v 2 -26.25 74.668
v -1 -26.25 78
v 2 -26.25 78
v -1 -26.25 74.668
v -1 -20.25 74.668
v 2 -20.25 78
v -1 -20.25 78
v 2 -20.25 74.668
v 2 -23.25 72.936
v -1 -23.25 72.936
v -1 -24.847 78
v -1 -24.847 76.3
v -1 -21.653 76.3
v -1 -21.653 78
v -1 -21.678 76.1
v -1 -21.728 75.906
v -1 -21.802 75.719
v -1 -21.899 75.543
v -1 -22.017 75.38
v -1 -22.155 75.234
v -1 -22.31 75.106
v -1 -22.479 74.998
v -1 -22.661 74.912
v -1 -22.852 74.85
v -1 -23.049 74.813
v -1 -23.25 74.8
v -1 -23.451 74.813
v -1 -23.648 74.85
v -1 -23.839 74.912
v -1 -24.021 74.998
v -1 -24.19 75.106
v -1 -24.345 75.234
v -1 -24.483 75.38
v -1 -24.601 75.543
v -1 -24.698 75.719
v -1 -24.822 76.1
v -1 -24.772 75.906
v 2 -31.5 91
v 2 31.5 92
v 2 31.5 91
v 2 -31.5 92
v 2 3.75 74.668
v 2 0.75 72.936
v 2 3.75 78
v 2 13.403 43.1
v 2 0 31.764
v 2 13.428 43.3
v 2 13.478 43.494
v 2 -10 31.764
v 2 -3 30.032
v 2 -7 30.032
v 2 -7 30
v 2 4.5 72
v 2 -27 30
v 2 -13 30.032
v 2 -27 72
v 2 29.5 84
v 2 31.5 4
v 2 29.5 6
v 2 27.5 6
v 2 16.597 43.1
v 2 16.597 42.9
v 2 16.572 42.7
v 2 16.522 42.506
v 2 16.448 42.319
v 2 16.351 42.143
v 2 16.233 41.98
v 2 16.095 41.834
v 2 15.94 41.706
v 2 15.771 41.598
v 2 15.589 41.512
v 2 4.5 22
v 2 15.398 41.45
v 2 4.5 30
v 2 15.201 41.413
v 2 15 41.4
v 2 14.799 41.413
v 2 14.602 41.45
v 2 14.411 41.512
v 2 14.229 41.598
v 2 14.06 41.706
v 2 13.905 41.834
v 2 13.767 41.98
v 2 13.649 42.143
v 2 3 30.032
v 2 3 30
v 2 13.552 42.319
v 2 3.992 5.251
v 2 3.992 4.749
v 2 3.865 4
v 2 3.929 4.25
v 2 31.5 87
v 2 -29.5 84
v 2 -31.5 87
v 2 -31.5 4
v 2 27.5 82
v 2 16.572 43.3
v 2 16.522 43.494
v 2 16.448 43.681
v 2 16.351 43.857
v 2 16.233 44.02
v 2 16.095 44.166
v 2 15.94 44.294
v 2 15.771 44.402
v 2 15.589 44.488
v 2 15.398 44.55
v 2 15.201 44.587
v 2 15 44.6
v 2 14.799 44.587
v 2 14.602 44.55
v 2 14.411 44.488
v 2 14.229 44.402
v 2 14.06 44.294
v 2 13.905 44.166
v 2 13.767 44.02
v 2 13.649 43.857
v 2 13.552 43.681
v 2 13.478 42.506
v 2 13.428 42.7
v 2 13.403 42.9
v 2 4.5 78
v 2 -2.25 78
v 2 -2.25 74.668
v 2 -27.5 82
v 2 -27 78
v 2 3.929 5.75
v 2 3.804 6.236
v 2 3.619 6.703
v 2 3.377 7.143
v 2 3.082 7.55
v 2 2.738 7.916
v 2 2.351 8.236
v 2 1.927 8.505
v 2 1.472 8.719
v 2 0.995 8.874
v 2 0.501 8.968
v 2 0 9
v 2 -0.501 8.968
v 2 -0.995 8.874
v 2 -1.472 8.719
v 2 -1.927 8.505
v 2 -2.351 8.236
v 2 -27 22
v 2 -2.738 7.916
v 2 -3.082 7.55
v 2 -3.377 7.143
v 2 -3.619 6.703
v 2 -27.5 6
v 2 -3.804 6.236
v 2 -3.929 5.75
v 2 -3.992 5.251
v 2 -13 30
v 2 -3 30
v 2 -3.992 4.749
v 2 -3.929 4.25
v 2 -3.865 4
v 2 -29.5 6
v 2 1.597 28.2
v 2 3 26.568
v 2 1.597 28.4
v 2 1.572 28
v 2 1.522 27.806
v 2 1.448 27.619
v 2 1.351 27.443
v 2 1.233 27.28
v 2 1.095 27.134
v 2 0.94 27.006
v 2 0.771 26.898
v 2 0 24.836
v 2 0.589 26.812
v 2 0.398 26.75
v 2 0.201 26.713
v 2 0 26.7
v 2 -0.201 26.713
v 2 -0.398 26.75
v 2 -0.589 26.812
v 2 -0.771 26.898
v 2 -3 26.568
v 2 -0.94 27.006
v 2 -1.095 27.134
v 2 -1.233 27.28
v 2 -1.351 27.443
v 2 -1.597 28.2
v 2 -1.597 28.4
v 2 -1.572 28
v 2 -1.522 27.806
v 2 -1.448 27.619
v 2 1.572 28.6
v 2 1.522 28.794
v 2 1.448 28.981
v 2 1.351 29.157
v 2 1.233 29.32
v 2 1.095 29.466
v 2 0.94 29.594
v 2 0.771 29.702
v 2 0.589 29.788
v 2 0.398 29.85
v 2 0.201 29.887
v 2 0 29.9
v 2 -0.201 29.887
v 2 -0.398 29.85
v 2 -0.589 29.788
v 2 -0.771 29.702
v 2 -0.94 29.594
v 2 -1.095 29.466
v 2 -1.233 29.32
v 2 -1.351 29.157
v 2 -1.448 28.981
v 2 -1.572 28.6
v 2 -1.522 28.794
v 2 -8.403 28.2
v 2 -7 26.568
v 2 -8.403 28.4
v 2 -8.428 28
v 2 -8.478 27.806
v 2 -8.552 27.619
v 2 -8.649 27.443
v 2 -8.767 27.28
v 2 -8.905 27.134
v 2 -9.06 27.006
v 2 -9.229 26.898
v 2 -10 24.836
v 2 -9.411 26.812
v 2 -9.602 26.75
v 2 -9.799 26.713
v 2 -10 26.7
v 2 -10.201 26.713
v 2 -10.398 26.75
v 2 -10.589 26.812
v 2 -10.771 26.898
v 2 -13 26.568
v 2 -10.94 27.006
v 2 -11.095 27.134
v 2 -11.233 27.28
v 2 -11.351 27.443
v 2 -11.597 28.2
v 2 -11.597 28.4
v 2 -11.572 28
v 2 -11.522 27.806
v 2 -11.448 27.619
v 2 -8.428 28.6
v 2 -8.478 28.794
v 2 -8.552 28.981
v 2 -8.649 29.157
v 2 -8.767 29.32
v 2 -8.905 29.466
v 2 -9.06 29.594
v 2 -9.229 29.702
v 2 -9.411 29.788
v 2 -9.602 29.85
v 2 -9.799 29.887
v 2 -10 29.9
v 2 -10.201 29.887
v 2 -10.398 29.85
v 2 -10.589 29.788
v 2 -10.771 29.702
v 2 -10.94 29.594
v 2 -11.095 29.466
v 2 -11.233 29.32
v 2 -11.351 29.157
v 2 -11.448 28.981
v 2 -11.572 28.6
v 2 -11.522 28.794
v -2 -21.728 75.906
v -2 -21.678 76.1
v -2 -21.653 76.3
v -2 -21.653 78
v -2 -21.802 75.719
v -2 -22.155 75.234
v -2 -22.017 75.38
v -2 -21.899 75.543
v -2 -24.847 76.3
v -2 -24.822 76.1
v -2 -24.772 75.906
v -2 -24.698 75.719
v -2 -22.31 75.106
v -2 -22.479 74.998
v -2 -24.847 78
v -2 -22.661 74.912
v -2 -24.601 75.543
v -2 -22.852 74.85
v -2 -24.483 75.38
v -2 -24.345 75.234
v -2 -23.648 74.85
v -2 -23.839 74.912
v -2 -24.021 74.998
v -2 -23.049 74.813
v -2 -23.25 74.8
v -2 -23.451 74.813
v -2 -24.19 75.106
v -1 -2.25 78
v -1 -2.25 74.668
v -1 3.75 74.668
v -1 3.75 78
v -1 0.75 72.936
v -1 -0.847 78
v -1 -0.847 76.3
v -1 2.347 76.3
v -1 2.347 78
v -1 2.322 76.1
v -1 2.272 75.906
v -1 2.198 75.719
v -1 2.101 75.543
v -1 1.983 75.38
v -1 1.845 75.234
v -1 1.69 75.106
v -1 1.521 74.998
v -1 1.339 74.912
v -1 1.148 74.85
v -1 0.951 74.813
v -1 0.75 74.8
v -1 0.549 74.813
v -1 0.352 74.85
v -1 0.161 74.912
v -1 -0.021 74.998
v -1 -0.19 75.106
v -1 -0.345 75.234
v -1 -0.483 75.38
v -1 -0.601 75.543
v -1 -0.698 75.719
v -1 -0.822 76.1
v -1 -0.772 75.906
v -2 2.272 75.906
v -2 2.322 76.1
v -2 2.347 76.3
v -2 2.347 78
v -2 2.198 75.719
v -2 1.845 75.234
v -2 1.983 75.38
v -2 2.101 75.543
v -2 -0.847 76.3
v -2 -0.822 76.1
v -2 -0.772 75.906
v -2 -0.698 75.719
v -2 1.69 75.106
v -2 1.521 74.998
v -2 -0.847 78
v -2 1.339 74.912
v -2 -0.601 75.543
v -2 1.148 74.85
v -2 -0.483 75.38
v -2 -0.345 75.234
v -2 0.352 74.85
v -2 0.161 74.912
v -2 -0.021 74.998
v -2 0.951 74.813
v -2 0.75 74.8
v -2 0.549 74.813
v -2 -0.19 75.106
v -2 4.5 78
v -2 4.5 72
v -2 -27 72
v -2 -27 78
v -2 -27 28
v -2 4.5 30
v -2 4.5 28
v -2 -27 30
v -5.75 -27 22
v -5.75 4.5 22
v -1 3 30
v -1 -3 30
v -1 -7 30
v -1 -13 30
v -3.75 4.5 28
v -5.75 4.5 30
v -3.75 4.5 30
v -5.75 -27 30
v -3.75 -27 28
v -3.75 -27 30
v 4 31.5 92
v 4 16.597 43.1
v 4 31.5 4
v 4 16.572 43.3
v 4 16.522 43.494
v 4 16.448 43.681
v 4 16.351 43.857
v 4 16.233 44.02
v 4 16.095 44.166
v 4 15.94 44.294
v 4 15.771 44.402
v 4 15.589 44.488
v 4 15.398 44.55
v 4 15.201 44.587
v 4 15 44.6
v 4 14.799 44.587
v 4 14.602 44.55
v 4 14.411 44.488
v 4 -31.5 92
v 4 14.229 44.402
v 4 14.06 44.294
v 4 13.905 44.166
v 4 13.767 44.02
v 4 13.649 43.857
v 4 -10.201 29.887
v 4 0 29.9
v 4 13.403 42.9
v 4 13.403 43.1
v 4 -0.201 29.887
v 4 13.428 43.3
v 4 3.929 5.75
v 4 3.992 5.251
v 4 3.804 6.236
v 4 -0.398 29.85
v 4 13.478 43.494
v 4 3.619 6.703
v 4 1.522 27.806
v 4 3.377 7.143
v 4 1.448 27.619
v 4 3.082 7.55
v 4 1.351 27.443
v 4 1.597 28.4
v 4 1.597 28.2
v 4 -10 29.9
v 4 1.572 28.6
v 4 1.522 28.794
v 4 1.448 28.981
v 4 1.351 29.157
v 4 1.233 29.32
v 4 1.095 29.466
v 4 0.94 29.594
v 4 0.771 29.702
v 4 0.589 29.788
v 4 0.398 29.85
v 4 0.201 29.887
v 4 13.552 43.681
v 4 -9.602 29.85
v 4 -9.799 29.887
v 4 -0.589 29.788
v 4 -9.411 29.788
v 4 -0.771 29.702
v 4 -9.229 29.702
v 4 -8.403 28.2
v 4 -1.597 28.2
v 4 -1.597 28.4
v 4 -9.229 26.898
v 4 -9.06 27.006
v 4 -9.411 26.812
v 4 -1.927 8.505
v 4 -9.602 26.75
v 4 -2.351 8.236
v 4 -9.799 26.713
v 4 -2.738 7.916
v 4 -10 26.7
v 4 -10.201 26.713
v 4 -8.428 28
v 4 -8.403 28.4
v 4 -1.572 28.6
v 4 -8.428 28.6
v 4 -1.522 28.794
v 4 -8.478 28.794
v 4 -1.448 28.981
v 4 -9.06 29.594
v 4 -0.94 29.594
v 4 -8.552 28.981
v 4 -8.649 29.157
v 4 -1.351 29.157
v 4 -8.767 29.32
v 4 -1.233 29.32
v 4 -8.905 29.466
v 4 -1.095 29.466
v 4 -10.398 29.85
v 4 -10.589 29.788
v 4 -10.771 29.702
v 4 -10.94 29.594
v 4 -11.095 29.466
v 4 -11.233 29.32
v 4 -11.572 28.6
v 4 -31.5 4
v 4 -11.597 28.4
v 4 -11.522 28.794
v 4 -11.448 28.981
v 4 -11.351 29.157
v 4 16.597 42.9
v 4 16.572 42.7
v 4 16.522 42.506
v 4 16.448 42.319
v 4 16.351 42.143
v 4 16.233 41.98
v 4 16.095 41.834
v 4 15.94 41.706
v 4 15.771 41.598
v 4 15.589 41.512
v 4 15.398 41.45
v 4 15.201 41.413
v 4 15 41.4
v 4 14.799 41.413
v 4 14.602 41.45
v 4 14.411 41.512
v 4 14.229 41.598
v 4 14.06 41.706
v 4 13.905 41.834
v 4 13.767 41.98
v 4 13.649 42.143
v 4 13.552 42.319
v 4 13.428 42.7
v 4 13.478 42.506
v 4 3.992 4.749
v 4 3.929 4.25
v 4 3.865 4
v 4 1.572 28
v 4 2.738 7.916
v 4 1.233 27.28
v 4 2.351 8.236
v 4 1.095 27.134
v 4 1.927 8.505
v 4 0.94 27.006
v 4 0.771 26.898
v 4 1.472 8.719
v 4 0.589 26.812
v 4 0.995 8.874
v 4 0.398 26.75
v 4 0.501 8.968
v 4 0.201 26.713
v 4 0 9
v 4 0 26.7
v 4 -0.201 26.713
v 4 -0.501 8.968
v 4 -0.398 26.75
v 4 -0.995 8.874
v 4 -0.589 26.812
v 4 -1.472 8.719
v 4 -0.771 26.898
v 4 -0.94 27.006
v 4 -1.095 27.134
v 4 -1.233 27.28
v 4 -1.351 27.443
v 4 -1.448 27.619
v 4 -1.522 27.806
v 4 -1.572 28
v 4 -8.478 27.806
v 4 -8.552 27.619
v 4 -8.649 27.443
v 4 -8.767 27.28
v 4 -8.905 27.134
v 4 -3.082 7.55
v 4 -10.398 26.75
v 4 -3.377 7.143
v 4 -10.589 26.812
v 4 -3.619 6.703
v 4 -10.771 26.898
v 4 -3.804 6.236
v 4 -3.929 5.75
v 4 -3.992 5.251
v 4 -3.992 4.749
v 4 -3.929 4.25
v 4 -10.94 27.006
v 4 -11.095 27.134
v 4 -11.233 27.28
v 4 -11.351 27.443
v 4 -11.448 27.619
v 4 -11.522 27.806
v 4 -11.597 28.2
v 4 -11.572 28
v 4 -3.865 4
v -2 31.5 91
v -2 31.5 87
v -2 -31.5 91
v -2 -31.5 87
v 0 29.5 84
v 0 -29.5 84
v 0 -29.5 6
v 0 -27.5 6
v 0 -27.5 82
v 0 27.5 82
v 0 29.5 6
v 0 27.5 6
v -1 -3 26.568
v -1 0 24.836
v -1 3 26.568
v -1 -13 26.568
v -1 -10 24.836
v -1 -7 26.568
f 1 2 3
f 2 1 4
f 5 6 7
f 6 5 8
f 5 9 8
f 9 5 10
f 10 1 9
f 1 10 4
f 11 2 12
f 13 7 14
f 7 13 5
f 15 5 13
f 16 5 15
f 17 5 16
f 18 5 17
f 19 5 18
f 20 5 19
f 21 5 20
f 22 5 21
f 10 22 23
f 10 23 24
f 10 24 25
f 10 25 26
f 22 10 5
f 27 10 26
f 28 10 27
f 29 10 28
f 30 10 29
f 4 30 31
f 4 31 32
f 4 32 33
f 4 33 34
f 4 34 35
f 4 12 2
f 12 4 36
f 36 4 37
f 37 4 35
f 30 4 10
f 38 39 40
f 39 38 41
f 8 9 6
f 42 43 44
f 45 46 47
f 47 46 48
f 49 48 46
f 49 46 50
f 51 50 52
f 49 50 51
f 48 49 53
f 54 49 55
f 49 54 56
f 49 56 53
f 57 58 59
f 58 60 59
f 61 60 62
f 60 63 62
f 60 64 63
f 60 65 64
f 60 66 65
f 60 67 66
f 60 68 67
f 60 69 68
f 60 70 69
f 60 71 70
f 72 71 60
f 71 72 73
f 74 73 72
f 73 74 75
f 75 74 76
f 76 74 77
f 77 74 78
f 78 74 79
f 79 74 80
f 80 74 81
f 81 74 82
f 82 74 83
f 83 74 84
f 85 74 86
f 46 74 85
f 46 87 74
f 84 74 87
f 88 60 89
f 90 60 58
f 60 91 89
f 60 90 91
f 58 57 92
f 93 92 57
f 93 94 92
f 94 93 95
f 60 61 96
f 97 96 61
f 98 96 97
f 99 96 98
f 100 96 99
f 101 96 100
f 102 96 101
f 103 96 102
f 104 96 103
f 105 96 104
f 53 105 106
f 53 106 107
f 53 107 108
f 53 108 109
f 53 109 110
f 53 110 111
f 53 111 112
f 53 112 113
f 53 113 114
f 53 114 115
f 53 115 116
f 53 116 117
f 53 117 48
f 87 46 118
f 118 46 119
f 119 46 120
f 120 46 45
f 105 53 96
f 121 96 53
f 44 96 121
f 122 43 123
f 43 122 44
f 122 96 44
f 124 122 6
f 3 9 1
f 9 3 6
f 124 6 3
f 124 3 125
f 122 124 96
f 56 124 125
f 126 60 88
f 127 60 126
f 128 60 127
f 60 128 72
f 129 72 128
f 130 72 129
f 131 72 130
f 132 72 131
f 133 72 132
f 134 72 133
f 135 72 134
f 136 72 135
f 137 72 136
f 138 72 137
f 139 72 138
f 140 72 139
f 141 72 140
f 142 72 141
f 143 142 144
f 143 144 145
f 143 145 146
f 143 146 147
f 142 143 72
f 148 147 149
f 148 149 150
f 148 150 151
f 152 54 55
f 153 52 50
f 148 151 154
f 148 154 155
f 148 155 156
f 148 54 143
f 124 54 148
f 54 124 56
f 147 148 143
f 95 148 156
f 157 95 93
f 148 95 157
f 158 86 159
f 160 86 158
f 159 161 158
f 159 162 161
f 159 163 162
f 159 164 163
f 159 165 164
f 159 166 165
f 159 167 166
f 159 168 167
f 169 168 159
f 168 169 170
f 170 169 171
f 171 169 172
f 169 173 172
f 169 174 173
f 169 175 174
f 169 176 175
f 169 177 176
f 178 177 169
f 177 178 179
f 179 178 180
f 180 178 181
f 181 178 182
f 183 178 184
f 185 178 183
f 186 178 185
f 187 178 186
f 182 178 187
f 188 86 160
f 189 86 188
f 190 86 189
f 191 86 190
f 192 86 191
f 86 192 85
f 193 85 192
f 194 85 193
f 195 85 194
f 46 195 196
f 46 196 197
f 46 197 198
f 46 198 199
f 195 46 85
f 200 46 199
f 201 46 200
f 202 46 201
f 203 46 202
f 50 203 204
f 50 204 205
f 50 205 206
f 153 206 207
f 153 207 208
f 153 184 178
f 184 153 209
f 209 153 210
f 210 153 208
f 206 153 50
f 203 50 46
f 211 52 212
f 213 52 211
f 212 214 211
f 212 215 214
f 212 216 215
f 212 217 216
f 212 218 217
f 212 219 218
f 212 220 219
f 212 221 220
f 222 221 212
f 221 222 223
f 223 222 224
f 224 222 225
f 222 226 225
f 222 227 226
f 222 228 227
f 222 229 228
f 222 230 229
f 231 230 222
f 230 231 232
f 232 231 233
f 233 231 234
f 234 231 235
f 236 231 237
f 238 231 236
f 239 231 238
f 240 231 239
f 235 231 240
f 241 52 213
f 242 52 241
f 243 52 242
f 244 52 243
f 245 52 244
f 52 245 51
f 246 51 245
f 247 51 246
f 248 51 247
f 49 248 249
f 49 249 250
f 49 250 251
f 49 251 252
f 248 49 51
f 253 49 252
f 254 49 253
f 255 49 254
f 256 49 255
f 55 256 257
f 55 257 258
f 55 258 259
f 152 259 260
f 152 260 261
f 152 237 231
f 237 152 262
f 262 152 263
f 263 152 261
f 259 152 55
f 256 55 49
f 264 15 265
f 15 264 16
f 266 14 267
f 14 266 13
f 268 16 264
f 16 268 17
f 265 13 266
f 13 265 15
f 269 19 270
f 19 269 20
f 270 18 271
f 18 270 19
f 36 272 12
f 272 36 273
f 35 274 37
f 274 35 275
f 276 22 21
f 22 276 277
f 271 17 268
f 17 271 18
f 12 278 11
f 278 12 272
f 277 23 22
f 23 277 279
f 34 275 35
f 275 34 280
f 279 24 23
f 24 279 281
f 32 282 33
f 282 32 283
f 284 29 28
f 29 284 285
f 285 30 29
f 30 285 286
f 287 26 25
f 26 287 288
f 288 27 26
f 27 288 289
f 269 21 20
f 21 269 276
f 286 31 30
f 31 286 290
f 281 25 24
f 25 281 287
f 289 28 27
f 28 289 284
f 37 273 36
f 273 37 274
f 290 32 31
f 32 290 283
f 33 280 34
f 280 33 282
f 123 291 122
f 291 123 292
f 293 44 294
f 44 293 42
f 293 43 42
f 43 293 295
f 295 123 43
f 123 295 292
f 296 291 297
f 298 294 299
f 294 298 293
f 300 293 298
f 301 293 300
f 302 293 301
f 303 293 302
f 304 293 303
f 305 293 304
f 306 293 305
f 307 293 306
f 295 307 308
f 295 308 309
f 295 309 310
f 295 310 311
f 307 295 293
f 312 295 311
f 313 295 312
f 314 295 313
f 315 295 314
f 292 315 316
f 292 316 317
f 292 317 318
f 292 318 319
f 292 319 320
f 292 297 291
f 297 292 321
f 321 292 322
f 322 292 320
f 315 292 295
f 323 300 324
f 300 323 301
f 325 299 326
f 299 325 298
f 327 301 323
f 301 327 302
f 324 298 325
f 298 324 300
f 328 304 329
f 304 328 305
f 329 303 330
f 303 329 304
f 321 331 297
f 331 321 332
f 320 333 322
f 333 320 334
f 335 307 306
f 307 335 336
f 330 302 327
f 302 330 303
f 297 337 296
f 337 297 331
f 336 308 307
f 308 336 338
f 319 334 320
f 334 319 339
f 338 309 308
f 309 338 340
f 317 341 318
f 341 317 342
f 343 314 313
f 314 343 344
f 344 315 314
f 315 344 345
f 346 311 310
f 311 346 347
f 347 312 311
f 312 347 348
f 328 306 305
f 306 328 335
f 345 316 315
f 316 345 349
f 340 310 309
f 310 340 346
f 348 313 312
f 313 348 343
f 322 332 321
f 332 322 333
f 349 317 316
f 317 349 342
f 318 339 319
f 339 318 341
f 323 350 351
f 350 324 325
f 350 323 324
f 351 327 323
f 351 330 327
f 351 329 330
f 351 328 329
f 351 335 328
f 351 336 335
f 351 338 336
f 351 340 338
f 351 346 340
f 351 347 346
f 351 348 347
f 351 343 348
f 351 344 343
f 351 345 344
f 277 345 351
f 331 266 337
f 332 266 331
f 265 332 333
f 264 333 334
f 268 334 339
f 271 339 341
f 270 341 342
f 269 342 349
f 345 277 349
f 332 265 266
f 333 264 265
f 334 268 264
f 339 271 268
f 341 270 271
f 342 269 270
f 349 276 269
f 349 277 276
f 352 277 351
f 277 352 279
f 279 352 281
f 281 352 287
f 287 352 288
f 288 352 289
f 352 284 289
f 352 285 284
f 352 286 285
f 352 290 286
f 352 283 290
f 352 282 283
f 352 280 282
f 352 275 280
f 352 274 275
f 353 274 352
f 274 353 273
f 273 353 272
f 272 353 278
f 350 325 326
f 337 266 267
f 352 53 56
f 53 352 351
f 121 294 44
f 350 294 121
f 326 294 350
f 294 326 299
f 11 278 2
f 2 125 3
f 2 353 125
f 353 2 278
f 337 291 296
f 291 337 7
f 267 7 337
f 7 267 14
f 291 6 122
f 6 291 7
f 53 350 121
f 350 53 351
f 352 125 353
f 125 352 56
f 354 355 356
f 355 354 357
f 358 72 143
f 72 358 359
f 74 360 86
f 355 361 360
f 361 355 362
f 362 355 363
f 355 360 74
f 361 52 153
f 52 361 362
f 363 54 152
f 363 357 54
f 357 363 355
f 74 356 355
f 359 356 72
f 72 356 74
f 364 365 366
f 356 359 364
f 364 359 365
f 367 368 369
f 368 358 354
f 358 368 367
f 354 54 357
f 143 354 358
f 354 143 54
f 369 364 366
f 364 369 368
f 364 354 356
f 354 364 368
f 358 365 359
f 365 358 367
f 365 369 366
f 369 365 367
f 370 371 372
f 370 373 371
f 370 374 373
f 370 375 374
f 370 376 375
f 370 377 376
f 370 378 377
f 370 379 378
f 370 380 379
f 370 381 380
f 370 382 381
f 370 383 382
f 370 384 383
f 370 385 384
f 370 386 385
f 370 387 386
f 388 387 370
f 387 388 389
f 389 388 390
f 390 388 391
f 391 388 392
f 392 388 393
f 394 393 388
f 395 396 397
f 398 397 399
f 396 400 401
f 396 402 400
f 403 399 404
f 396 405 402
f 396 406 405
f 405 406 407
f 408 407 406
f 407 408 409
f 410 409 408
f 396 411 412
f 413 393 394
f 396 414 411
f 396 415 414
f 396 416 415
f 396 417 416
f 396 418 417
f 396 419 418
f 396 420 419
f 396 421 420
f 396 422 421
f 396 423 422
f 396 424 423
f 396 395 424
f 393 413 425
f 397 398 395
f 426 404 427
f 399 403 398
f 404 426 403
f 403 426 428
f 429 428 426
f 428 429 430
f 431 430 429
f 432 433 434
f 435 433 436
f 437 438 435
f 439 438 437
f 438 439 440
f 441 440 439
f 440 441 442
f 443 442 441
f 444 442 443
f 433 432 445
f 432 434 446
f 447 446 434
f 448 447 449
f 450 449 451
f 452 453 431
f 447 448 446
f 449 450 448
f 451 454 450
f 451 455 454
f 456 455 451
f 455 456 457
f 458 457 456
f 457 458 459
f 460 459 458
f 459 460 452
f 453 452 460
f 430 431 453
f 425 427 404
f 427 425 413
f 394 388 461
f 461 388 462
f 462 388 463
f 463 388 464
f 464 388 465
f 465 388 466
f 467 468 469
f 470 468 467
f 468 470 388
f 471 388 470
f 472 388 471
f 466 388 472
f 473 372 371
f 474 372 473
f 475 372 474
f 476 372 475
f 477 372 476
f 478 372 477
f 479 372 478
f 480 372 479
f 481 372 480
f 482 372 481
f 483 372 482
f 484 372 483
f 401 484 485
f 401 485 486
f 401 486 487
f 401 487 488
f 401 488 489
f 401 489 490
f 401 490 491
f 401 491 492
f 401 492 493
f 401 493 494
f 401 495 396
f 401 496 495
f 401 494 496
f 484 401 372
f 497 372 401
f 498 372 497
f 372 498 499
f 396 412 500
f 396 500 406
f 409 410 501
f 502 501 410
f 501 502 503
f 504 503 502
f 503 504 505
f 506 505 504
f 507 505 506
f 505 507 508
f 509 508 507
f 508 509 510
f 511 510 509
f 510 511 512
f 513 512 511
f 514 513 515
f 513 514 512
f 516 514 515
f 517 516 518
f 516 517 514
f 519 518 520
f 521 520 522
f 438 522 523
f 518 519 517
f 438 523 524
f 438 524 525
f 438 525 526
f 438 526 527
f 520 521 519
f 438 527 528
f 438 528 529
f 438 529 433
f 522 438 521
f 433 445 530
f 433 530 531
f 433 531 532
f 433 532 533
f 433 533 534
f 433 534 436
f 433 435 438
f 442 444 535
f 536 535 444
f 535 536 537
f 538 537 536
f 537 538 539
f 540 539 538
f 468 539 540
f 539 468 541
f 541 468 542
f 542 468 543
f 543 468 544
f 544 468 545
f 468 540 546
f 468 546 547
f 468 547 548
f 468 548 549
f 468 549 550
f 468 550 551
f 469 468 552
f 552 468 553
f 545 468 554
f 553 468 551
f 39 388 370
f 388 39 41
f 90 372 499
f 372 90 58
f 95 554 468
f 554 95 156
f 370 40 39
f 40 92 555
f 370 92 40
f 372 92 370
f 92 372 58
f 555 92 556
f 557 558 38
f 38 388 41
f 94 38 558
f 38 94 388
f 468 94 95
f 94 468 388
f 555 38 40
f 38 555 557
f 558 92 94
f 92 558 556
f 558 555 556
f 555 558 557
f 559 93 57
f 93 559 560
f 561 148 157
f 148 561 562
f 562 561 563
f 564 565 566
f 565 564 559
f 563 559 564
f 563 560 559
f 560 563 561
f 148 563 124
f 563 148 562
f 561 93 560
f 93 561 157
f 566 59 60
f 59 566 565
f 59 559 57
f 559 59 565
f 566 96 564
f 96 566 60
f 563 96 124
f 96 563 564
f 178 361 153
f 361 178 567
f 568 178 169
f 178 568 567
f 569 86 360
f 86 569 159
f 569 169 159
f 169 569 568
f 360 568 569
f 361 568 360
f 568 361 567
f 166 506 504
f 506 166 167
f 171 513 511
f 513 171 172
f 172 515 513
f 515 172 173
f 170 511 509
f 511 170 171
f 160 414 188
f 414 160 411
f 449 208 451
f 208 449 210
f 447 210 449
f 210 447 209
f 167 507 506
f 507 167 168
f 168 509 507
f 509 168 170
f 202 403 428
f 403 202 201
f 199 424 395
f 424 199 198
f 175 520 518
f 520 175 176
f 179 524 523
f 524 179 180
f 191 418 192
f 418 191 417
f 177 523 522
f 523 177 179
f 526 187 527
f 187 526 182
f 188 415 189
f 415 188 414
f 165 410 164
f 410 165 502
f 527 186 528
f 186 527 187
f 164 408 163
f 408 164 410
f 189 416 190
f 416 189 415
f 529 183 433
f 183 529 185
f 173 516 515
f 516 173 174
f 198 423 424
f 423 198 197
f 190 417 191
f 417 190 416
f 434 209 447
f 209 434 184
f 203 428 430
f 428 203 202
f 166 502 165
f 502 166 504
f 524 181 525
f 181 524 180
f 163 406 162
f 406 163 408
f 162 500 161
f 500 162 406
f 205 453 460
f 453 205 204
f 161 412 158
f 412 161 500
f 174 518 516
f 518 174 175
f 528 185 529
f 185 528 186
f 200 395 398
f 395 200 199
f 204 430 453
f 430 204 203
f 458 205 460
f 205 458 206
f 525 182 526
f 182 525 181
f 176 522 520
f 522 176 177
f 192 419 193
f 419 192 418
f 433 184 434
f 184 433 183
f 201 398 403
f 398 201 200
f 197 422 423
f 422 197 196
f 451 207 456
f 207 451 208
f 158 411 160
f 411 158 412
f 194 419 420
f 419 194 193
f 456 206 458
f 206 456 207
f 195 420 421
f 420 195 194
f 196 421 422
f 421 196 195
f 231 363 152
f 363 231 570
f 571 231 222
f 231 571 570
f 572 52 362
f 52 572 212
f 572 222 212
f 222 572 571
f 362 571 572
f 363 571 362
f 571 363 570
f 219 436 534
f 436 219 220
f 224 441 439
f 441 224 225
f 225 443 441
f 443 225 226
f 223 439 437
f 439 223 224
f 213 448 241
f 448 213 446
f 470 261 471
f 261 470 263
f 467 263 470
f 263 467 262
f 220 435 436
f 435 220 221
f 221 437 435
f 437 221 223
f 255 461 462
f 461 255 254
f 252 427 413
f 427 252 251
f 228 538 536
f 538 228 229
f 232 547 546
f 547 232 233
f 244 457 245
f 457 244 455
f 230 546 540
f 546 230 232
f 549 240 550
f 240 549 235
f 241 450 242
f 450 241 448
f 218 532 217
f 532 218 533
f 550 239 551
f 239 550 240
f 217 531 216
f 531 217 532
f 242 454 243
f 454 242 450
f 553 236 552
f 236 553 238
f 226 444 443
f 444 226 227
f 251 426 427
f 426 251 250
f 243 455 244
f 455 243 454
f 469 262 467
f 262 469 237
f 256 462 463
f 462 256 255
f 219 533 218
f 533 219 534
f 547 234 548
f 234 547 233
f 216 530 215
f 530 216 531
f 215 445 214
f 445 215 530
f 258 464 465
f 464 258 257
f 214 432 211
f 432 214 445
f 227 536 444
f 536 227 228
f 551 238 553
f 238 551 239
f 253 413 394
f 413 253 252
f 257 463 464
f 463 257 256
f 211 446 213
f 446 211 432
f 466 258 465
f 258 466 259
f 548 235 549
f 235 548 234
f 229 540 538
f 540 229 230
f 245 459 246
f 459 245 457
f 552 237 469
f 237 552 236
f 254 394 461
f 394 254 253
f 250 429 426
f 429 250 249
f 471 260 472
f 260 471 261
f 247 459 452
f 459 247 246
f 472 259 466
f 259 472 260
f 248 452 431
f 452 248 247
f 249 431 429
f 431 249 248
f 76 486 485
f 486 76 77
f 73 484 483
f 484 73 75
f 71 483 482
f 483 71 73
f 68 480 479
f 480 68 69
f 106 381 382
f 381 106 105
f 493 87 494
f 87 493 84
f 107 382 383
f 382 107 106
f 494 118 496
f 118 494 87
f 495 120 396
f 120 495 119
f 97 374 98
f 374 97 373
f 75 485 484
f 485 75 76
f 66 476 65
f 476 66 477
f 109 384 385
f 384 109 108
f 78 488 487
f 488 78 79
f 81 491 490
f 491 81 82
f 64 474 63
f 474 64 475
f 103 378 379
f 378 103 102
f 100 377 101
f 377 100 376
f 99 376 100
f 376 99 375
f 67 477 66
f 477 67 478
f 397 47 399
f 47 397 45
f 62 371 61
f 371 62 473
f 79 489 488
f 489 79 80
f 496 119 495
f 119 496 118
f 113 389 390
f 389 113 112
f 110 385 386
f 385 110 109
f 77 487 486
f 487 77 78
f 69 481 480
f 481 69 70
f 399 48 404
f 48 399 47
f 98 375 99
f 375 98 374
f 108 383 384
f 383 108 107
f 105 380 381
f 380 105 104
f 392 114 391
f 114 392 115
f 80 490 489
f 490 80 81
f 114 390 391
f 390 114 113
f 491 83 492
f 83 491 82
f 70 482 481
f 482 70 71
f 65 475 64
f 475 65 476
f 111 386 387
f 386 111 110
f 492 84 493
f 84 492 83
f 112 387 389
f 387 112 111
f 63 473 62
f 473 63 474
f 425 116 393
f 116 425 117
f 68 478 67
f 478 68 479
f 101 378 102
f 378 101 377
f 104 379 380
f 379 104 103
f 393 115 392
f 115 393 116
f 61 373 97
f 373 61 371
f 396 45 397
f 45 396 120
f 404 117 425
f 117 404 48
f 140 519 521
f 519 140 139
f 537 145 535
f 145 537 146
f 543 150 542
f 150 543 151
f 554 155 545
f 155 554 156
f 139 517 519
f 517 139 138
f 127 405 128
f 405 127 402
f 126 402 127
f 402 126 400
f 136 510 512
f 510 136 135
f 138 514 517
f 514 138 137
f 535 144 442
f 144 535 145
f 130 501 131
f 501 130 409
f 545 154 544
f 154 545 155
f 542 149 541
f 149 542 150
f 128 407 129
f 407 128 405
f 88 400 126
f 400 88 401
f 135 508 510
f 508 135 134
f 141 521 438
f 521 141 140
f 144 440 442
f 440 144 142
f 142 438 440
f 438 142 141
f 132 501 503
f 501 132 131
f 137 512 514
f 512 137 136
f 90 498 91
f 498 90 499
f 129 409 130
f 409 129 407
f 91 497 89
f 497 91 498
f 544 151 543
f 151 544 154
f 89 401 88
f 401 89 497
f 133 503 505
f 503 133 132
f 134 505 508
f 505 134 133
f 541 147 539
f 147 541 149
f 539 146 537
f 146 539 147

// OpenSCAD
/**
 * Design for a Stevenson Screen type container
 *
 * License:  Attribution-ShareAlike 4.0 International 
 * https://creativecommons.org/licenses/by-sa/4.0/
 *
 * Based on an original idea from http://jeelabs.net/boards/6/topics/1857
 *
**/


/*
 * makeBase:base,
   makeBottom:bottom,
   makeMiddle:middle,
   makeTop,top,
   makeAll:all
 *
**/
part = "makeAll"; 

$fn=50;
id=65;
od=105;
sectionheight=33;
walls=2;
bolt=4.2;
top_depth=walls+1;
pillar_radius = (id/2)+(bolt*walls)+walls;
pillarheight=(sectionheight-(walls*2));
containerHeight = 83;

nutSize = 6;
nutHeight = 3;
nutThread = 3.2;
boltLength = 8;

pcbWidth = 31.5;
pcbHeight = 52.5;
pcbThickness = 1.75;
pcbHoleCentres = 24;

// Base
//base();

mountingPlate();
/*
internalCase();

// Bottom Section
color("DeepSkyBlue", 0.5) translate([0,0,walls*2]) {
    difference() {
        section();
        translate([pillar_radius,0,0]) {
            bolthole();        }
        translate([-pillar_radius/2,((pillar_radius)*sin(120)),0]) {
            bolthole();
        }
        translate([-pillar_radius/2,-((pillar_radius)*sin(120)),0]) {
            bolthole();
        }
    }
}

//Middle Section
color("DeepSkyBlue", 0.5) translate([0,0,sectionheight]) {
    difference() {
        section();
        translate([pillar_radius,0,0]) {
            bolthole();        }
        translate([-pillar_radius/2,((pillar_radius)*sin(120)),0]) {
            bolthole();
        }
        translate([-pillar_radius/2,-((pillar_radius)*sin(120)),0]) {
            bolthole();
        }
    }
}


// Top Section
%translate([0,0,sectionheight*2-(walls*2)]) {
    difference() {
        section();
        translate([pillar_radius,0,0]) {
            bolthole();
        }
        translate([-pillar_radius/2,((pillar_radius)*sin(120)),0]) {
            bolthole();
        }
        translate([-pillar_radius/2,-((pillar_radius)*sin(120)),0]) {
            bolthole();
        }
    }
}

// Top
color("DeepSkyBlue", 0.5) translate([0,0,sectionheight*3-(top_depth*2+1)]) top();
*/
module section() {
    difference() {
        cylinder(sectionheight,(od+walls)/2,(id+walls)/2 );
        cylinder(sectionheight,(od/2),(id/2));
    }
    // Skirt
    translate([0,0,-walls*2]) {
        difference() {
            cylinder(walls*2,(od+walls)/2,(od+walls)/2);
            cylinder(walls*2,od/2,od/2);
        }
    }
    translate([pillar_radius,0,0]) {
         pillar();
    }
    translate([-pillar_radius/2,((pillar_radius)*sin(120)),0]) {
        pillar();
    }
    translate([-pillar_radius/2,-((pillar_radius)*sin(120)),0]) {
        pillar();
    }    
}

module pillar() {
    translate([0,0,walls*2]) {
        difference(){
            cylinder(pillarheight,bolt*walls, bolt*walls);
            bolthole();
        }
    }
}

module bolthole() {
    cylinder(pillarheight,bolt/2,bolt/2);
}

module base() {
    base_thickness=walls;
    difference() {
        union() {
            cylinder(base_thickness,(od-4)/2,(od-4)/2);
            translate([0,0,base_thickness]) {
                cylinder(base_thickness,(od-4)/2,(od-8)/2);
            }
            translate([0,-((id-walls)/2),base_thickness*2]) divider();
        }
        translate([pillar_radius,0,0]) {
            bolthole();
        }
        translate([-pillar_radius/2,((pillar_radius)*sin(120)),0]) {
            bolthole();
        }
        translate([-pillar_radius/2,-((pillar_radius)*sin(120)),0]) {
            bolthole();
        }
    }
}

module top() {
    cylinder(top_depth,(id+walls)/2,(id+walls)/2);
    translate([pillar_radius,0,0]) {
        lobe();
    }
    translate([-pillar_radius/2,((pillar_radius)*sin(120)),0]) {
        rotate(120) lobe();
    }
    translate([-pillar_radius/2,-((pillar_radius)*sin(120)),0]) {
        rotate(-120) lobe();
    }
    translate([0,-((id-walls)/2),top_depth-(walls*2)]) divider();
}

module lobe() {
    difference(){
        hull() {
            cylinder(top_depth,bolt*walls, bolt*walls);
            translate([-bolt*walls,0,0]) {
                cylinder(top_depth,bolt*walls, bolt*walls);
            }
        }
        cylinder(top_depth,bolt,bolt);
    }
}
module divider() {
    widthOfBaseBlock=walls*3;
    difference() {
        cube([widthOfBaseBlock,id-walls,walls]);
        translate([(widthOfBaseBlock/4),0,0]){
            cube([walls+(walls/2),id-walls,walls*2]);
        }
    }
}

module mountingPlate() {
    difference() {
        union() {
            // Plate
            translate([walls,-((id-walls)/2), walls*2]) {
                cube([walls,id-walls,(pillarheight*3)+(walls/2)]);
            }
            // External top bar
            translate([-walls,-((id-walls)/2), containerHeight+(walls*2)]) {
                cube([walls*2, id-walls,walls*2]);
            }
            // Side bar
            translate([0,-((id-walls)/2)+walls,walls*3]) {
                cube([walls,walls,containerHeight-walls*2.5]);
            }
            // Side bar
            translate([0,((id-walls)/2)-(walls*2),walls*3]) {
                cube([walls, walls,containerHeight-walls*2.5]);
            }
            // Internal top bar
            translate([0,-(id-(walls*5))/2,containerHeight-(walls-1)]) {
                cube([walls,id-(walls*5), walls]);
            }
            // PCB top mount
            translate([walls,-27,(walls*2)+74]) {
                rotate([0,180,0]) {
                    pcbTopMount();
                }
            }
            translate([walls,-27,(walls*2)+(74-50)]) {
                rotate([0,180,0]) {
                    pcbBottomMount();
                }
            }
        }
        // Battery case mounting hole
        translate([walls-1,((id-walls)/2)-(walls*2)-11-(3/2),(walls*2)+39]) {
            rotate([0, 90,0]) {
                cylinder(d=3.2,h=walls+2);
            }
        }
        // Sensor cable access
        translate([walls-1,0,5]) {
            rotate([0,90,0]){
                cylinder(d=8,h=walls+2);
            }
        }
        // BME280 mounting holes
        translate([-1,0,(walls*2)+24.3]) {
            rotate([0,90,0]) {
                cylinder(d=3.2,h=walls+2);
                bolt(nutSize,nutHeight, nutThread,boltLength);

                translate([0,-10,0]) {
                    cylinder(d=3.2,h=walls+2);
                bolt(nutSize,nutHeight, nutThread,boltLength);

                }
            }
        }
    }
}

module internalCase() {
    odia = id-walls;
    idia = id-(walls*2.5);
    translate([0, 0, walls*2]) {        
        difference() {
            cylinder(h=containerHeight,d1=odia,d2=odia);
            cylinder(h=containerHeight-walls,d1=idia,d2=idia);
            translate([walls,-id/2,0]) {
                cube([id/2, id, containerHeight]);
            }
            translate([0,-odia/2,0]) {
                cube([walls,odia,walls]);
            }  
        }
    }
}

module pcbTopMount() {
    diff = (pcbWidth-pcbHoleCentres) / 2;
    difference() {
        cube([nutHeight+1,pcbWidth,nutSize]);
        translate([0,diff,(nutThread/2)]){
            rotate([0,90,0]) {
                bolt(nutSize,nutHeight, nutThread,boltLength,true);
            }
        }
        translate([0,(pcbWidth-diff),(nutThread/2)]){
            rotate([0,90,0]) {
                bolt(nutSize,nutHeight, nutThread,boltLength, true);
            }
        }
    }
}

module pcbBottomMount() {
        translate([0,0,-2]) {
            cube([nutHeight+1,pcbWidth,nutSize+2]);
        }
        translate([nutHeight+1,0,0]) {
            cube([pcbThickness,pcbWidth,nutSize]);
        }
        translate([nutHeight+1+pcbThickness,0,-2]) {
            cube([walls,pcbWidth,nutSize+2]);
        }
}

// Nut
module nut(width,height,thread) {
    difference() {
        cylinder(d=width/(cos(180/6)), h=height, $fn=6);
        translate([0,0,-0.5]) {
            cylinder(d=thread,h=height+1);
        }
    }
}

module bolt(width,height,thread,length,hull) {
    cylinder(d=width/(cos(180/6)), h=height, $fn=6);
    if(hull) {
        hull(){
            translate([0,0,height]) {
                cylinder(d=thread,h=length);
            }
            translate([thread,0,height]) {
                cylinder(d=thread,h=length);
            }
        }
    } else {
        translate([0,0,height]) {
            cylinder(d=thread,h=length);
        }
    }
}
